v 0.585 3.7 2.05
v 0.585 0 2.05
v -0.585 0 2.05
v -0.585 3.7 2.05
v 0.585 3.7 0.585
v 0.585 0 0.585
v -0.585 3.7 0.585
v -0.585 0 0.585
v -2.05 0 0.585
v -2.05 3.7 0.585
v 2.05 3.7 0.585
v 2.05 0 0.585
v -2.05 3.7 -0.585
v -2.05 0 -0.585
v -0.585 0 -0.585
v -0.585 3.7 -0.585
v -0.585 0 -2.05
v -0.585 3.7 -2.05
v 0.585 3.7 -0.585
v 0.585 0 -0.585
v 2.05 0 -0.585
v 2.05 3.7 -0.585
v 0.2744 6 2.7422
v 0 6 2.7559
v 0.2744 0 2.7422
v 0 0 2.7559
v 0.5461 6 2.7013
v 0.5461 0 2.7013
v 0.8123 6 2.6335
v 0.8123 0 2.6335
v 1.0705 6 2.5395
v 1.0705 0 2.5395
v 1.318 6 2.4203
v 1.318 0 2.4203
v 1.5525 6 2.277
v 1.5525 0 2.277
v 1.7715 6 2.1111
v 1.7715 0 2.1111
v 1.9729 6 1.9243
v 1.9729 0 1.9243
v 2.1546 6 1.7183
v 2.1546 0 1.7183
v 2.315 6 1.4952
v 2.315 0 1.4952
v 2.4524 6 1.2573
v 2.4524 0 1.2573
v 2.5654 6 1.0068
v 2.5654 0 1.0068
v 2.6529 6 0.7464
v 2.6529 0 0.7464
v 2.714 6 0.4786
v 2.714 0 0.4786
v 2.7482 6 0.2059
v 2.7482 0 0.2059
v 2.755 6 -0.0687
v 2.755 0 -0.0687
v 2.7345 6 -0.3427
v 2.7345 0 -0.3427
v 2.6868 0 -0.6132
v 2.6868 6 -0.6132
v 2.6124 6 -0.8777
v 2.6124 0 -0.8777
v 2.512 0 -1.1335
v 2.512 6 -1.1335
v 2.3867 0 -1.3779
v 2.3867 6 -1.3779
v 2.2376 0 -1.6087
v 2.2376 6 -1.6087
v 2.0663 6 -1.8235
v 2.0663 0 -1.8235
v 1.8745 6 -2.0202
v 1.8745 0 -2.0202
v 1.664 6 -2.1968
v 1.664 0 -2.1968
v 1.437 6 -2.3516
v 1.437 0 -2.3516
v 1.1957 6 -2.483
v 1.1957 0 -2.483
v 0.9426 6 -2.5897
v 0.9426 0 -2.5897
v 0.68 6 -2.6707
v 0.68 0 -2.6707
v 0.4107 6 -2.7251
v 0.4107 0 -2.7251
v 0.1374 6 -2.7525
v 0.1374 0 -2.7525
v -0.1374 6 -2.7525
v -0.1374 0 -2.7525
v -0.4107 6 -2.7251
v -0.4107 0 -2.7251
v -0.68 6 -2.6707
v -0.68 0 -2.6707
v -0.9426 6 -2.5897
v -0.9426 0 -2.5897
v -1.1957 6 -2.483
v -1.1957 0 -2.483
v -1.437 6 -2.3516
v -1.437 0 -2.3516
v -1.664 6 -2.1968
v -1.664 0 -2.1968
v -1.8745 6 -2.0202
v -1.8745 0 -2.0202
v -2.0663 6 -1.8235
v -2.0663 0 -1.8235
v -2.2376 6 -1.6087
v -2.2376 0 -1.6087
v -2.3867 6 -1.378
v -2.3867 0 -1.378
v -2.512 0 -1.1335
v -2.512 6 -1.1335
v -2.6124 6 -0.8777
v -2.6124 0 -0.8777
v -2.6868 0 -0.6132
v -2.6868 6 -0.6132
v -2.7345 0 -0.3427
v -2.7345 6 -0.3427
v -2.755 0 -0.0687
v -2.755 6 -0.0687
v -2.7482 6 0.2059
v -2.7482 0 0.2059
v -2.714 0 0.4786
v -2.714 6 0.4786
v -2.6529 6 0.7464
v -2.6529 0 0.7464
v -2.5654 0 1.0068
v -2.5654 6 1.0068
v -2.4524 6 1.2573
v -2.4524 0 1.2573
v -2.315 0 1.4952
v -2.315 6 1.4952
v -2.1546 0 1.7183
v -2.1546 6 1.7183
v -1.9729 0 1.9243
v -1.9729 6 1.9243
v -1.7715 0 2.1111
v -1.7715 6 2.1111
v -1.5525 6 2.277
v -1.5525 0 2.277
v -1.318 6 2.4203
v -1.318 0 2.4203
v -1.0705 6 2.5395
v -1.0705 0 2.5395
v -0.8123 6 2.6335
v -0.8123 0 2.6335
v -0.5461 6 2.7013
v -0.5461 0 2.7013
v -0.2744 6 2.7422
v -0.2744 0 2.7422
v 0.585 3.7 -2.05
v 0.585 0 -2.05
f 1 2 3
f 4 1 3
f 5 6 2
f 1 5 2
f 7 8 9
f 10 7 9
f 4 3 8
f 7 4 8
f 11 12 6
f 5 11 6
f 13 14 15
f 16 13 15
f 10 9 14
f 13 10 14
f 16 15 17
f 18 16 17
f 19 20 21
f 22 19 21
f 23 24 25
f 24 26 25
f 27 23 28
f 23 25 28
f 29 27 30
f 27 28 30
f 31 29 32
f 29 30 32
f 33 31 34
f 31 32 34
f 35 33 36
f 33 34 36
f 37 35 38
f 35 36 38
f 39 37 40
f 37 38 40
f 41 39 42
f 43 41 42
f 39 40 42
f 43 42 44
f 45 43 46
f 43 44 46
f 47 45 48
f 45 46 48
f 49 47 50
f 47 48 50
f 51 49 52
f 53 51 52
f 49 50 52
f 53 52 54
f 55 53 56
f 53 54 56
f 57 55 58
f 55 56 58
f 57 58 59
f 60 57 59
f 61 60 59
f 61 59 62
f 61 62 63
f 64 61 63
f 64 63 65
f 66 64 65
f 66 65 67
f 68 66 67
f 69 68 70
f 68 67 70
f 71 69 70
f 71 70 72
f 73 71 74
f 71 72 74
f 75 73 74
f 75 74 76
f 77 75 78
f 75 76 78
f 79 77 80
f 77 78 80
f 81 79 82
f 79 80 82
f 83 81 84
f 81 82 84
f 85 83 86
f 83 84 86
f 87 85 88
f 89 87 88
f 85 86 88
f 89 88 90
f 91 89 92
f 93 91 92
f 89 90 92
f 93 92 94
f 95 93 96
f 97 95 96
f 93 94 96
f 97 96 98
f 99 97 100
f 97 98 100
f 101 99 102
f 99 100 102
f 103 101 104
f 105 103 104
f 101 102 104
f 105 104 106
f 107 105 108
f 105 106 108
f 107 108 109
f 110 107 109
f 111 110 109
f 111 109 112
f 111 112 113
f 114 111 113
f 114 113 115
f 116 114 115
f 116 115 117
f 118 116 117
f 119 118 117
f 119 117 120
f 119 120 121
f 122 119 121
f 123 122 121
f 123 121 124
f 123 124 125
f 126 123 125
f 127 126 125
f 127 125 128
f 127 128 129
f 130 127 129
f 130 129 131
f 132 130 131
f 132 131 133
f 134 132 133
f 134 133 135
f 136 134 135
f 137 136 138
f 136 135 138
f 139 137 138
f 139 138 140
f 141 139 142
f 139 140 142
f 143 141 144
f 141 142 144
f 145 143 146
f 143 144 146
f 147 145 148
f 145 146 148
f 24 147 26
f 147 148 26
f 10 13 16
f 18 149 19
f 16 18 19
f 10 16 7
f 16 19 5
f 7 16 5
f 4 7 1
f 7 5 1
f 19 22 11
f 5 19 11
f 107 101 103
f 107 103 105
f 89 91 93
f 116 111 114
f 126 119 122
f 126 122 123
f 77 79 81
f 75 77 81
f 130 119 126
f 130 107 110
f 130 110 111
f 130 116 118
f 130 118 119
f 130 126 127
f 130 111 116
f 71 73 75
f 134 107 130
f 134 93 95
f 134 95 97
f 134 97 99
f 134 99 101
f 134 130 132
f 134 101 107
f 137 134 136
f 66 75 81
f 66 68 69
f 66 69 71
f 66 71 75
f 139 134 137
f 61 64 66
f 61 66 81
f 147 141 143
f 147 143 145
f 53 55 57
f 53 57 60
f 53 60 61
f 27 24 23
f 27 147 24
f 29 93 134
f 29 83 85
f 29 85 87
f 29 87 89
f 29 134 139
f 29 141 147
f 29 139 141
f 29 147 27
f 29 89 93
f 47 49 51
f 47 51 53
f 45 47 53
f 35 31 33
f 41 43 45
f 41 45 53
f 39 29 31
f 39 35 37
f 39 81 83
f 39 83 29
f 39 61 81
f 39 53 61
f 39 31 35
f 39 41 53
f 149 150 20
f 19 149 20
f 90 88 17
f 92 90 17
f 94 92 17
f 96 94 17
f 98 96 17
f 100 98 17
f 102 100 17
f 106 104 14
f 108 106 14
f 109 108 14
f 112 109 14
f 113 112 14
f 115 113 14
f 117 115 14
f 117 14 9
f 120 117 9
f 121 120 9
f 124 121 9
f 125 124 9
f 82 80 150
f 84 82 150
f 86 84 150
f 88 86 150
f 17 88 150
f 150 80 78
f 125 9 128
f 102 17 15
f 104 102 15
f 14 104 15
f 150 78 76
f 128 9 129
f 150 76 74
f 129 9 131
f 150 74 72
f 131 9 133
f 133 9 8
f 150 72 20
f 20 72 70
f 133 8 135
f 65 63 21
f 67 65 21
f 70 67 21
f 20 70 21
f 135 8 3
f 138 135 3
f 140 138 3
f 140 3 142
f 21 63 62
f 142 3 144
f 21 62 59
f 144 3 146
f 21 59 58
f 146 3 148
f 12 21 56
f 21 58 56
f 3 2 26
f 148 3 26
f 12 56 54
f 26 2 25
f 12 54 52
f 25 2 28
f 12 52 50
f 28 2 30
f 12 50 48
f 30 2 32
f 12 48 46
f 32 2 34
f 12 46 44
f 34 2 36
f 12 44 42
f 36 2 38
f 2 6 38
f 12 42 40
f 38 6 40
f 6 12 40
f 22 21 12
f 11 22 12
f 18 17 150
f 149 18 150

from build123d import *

# Parameters (mm, degrees)
SKETCH1_R           = 2.7559
BOSS_EXTRUDE1_DEPTH = 3.7
BOSS_EXTRUDE2_START = 3.7
SKETCH1_3_R         = 2.7559
BOSS_EXTRUDE2_DEPTH = 2.3


with BuildPart() as part:
    # Sketch1 → Boss-Extrude1 (new body)
    with BuildSketch(Plane(origin=(0, 0, 0), x_dir=(1, 0, 0), z_dir=(0, 1, 0))):
        with Locations(Location((0, 0, 0), (0, 0, 270))):
            Circle(SKETCH1_R)
        Polygon((-2.05, -0.585), (-2.05, 0.585), (-0.585, 0.585), (-0.585, 2.05), (0.585, 2.05), (0.585, 0.585), (2.05, 0.585), (2.05, -0.585), (0.585, -0.585), (0.585, -2.05), (-0.585, -2.05), (-0.585, -0.585), align=None, mode=Mode.SUBTRACT)
    extrude(amount=BOSS_EXTRUDE1_DEPTH)

    # Sketch1<3> → Boss-Extrude2 (add)
    with BuildSketch(Plane(origin=(0, 0, 0), x_dir=(1, 0, 0), z_dir=(0, 1, 0)).offset(BOSS_EXTRUDE2_START)):
        with Locations(Location((0, 0, 0), (0, 0, 270))):
            Circle(SKETCH1_3_R)
    extrude(amount=BOSS_EXTRUDE2_DEPTH)


solid = part.part
